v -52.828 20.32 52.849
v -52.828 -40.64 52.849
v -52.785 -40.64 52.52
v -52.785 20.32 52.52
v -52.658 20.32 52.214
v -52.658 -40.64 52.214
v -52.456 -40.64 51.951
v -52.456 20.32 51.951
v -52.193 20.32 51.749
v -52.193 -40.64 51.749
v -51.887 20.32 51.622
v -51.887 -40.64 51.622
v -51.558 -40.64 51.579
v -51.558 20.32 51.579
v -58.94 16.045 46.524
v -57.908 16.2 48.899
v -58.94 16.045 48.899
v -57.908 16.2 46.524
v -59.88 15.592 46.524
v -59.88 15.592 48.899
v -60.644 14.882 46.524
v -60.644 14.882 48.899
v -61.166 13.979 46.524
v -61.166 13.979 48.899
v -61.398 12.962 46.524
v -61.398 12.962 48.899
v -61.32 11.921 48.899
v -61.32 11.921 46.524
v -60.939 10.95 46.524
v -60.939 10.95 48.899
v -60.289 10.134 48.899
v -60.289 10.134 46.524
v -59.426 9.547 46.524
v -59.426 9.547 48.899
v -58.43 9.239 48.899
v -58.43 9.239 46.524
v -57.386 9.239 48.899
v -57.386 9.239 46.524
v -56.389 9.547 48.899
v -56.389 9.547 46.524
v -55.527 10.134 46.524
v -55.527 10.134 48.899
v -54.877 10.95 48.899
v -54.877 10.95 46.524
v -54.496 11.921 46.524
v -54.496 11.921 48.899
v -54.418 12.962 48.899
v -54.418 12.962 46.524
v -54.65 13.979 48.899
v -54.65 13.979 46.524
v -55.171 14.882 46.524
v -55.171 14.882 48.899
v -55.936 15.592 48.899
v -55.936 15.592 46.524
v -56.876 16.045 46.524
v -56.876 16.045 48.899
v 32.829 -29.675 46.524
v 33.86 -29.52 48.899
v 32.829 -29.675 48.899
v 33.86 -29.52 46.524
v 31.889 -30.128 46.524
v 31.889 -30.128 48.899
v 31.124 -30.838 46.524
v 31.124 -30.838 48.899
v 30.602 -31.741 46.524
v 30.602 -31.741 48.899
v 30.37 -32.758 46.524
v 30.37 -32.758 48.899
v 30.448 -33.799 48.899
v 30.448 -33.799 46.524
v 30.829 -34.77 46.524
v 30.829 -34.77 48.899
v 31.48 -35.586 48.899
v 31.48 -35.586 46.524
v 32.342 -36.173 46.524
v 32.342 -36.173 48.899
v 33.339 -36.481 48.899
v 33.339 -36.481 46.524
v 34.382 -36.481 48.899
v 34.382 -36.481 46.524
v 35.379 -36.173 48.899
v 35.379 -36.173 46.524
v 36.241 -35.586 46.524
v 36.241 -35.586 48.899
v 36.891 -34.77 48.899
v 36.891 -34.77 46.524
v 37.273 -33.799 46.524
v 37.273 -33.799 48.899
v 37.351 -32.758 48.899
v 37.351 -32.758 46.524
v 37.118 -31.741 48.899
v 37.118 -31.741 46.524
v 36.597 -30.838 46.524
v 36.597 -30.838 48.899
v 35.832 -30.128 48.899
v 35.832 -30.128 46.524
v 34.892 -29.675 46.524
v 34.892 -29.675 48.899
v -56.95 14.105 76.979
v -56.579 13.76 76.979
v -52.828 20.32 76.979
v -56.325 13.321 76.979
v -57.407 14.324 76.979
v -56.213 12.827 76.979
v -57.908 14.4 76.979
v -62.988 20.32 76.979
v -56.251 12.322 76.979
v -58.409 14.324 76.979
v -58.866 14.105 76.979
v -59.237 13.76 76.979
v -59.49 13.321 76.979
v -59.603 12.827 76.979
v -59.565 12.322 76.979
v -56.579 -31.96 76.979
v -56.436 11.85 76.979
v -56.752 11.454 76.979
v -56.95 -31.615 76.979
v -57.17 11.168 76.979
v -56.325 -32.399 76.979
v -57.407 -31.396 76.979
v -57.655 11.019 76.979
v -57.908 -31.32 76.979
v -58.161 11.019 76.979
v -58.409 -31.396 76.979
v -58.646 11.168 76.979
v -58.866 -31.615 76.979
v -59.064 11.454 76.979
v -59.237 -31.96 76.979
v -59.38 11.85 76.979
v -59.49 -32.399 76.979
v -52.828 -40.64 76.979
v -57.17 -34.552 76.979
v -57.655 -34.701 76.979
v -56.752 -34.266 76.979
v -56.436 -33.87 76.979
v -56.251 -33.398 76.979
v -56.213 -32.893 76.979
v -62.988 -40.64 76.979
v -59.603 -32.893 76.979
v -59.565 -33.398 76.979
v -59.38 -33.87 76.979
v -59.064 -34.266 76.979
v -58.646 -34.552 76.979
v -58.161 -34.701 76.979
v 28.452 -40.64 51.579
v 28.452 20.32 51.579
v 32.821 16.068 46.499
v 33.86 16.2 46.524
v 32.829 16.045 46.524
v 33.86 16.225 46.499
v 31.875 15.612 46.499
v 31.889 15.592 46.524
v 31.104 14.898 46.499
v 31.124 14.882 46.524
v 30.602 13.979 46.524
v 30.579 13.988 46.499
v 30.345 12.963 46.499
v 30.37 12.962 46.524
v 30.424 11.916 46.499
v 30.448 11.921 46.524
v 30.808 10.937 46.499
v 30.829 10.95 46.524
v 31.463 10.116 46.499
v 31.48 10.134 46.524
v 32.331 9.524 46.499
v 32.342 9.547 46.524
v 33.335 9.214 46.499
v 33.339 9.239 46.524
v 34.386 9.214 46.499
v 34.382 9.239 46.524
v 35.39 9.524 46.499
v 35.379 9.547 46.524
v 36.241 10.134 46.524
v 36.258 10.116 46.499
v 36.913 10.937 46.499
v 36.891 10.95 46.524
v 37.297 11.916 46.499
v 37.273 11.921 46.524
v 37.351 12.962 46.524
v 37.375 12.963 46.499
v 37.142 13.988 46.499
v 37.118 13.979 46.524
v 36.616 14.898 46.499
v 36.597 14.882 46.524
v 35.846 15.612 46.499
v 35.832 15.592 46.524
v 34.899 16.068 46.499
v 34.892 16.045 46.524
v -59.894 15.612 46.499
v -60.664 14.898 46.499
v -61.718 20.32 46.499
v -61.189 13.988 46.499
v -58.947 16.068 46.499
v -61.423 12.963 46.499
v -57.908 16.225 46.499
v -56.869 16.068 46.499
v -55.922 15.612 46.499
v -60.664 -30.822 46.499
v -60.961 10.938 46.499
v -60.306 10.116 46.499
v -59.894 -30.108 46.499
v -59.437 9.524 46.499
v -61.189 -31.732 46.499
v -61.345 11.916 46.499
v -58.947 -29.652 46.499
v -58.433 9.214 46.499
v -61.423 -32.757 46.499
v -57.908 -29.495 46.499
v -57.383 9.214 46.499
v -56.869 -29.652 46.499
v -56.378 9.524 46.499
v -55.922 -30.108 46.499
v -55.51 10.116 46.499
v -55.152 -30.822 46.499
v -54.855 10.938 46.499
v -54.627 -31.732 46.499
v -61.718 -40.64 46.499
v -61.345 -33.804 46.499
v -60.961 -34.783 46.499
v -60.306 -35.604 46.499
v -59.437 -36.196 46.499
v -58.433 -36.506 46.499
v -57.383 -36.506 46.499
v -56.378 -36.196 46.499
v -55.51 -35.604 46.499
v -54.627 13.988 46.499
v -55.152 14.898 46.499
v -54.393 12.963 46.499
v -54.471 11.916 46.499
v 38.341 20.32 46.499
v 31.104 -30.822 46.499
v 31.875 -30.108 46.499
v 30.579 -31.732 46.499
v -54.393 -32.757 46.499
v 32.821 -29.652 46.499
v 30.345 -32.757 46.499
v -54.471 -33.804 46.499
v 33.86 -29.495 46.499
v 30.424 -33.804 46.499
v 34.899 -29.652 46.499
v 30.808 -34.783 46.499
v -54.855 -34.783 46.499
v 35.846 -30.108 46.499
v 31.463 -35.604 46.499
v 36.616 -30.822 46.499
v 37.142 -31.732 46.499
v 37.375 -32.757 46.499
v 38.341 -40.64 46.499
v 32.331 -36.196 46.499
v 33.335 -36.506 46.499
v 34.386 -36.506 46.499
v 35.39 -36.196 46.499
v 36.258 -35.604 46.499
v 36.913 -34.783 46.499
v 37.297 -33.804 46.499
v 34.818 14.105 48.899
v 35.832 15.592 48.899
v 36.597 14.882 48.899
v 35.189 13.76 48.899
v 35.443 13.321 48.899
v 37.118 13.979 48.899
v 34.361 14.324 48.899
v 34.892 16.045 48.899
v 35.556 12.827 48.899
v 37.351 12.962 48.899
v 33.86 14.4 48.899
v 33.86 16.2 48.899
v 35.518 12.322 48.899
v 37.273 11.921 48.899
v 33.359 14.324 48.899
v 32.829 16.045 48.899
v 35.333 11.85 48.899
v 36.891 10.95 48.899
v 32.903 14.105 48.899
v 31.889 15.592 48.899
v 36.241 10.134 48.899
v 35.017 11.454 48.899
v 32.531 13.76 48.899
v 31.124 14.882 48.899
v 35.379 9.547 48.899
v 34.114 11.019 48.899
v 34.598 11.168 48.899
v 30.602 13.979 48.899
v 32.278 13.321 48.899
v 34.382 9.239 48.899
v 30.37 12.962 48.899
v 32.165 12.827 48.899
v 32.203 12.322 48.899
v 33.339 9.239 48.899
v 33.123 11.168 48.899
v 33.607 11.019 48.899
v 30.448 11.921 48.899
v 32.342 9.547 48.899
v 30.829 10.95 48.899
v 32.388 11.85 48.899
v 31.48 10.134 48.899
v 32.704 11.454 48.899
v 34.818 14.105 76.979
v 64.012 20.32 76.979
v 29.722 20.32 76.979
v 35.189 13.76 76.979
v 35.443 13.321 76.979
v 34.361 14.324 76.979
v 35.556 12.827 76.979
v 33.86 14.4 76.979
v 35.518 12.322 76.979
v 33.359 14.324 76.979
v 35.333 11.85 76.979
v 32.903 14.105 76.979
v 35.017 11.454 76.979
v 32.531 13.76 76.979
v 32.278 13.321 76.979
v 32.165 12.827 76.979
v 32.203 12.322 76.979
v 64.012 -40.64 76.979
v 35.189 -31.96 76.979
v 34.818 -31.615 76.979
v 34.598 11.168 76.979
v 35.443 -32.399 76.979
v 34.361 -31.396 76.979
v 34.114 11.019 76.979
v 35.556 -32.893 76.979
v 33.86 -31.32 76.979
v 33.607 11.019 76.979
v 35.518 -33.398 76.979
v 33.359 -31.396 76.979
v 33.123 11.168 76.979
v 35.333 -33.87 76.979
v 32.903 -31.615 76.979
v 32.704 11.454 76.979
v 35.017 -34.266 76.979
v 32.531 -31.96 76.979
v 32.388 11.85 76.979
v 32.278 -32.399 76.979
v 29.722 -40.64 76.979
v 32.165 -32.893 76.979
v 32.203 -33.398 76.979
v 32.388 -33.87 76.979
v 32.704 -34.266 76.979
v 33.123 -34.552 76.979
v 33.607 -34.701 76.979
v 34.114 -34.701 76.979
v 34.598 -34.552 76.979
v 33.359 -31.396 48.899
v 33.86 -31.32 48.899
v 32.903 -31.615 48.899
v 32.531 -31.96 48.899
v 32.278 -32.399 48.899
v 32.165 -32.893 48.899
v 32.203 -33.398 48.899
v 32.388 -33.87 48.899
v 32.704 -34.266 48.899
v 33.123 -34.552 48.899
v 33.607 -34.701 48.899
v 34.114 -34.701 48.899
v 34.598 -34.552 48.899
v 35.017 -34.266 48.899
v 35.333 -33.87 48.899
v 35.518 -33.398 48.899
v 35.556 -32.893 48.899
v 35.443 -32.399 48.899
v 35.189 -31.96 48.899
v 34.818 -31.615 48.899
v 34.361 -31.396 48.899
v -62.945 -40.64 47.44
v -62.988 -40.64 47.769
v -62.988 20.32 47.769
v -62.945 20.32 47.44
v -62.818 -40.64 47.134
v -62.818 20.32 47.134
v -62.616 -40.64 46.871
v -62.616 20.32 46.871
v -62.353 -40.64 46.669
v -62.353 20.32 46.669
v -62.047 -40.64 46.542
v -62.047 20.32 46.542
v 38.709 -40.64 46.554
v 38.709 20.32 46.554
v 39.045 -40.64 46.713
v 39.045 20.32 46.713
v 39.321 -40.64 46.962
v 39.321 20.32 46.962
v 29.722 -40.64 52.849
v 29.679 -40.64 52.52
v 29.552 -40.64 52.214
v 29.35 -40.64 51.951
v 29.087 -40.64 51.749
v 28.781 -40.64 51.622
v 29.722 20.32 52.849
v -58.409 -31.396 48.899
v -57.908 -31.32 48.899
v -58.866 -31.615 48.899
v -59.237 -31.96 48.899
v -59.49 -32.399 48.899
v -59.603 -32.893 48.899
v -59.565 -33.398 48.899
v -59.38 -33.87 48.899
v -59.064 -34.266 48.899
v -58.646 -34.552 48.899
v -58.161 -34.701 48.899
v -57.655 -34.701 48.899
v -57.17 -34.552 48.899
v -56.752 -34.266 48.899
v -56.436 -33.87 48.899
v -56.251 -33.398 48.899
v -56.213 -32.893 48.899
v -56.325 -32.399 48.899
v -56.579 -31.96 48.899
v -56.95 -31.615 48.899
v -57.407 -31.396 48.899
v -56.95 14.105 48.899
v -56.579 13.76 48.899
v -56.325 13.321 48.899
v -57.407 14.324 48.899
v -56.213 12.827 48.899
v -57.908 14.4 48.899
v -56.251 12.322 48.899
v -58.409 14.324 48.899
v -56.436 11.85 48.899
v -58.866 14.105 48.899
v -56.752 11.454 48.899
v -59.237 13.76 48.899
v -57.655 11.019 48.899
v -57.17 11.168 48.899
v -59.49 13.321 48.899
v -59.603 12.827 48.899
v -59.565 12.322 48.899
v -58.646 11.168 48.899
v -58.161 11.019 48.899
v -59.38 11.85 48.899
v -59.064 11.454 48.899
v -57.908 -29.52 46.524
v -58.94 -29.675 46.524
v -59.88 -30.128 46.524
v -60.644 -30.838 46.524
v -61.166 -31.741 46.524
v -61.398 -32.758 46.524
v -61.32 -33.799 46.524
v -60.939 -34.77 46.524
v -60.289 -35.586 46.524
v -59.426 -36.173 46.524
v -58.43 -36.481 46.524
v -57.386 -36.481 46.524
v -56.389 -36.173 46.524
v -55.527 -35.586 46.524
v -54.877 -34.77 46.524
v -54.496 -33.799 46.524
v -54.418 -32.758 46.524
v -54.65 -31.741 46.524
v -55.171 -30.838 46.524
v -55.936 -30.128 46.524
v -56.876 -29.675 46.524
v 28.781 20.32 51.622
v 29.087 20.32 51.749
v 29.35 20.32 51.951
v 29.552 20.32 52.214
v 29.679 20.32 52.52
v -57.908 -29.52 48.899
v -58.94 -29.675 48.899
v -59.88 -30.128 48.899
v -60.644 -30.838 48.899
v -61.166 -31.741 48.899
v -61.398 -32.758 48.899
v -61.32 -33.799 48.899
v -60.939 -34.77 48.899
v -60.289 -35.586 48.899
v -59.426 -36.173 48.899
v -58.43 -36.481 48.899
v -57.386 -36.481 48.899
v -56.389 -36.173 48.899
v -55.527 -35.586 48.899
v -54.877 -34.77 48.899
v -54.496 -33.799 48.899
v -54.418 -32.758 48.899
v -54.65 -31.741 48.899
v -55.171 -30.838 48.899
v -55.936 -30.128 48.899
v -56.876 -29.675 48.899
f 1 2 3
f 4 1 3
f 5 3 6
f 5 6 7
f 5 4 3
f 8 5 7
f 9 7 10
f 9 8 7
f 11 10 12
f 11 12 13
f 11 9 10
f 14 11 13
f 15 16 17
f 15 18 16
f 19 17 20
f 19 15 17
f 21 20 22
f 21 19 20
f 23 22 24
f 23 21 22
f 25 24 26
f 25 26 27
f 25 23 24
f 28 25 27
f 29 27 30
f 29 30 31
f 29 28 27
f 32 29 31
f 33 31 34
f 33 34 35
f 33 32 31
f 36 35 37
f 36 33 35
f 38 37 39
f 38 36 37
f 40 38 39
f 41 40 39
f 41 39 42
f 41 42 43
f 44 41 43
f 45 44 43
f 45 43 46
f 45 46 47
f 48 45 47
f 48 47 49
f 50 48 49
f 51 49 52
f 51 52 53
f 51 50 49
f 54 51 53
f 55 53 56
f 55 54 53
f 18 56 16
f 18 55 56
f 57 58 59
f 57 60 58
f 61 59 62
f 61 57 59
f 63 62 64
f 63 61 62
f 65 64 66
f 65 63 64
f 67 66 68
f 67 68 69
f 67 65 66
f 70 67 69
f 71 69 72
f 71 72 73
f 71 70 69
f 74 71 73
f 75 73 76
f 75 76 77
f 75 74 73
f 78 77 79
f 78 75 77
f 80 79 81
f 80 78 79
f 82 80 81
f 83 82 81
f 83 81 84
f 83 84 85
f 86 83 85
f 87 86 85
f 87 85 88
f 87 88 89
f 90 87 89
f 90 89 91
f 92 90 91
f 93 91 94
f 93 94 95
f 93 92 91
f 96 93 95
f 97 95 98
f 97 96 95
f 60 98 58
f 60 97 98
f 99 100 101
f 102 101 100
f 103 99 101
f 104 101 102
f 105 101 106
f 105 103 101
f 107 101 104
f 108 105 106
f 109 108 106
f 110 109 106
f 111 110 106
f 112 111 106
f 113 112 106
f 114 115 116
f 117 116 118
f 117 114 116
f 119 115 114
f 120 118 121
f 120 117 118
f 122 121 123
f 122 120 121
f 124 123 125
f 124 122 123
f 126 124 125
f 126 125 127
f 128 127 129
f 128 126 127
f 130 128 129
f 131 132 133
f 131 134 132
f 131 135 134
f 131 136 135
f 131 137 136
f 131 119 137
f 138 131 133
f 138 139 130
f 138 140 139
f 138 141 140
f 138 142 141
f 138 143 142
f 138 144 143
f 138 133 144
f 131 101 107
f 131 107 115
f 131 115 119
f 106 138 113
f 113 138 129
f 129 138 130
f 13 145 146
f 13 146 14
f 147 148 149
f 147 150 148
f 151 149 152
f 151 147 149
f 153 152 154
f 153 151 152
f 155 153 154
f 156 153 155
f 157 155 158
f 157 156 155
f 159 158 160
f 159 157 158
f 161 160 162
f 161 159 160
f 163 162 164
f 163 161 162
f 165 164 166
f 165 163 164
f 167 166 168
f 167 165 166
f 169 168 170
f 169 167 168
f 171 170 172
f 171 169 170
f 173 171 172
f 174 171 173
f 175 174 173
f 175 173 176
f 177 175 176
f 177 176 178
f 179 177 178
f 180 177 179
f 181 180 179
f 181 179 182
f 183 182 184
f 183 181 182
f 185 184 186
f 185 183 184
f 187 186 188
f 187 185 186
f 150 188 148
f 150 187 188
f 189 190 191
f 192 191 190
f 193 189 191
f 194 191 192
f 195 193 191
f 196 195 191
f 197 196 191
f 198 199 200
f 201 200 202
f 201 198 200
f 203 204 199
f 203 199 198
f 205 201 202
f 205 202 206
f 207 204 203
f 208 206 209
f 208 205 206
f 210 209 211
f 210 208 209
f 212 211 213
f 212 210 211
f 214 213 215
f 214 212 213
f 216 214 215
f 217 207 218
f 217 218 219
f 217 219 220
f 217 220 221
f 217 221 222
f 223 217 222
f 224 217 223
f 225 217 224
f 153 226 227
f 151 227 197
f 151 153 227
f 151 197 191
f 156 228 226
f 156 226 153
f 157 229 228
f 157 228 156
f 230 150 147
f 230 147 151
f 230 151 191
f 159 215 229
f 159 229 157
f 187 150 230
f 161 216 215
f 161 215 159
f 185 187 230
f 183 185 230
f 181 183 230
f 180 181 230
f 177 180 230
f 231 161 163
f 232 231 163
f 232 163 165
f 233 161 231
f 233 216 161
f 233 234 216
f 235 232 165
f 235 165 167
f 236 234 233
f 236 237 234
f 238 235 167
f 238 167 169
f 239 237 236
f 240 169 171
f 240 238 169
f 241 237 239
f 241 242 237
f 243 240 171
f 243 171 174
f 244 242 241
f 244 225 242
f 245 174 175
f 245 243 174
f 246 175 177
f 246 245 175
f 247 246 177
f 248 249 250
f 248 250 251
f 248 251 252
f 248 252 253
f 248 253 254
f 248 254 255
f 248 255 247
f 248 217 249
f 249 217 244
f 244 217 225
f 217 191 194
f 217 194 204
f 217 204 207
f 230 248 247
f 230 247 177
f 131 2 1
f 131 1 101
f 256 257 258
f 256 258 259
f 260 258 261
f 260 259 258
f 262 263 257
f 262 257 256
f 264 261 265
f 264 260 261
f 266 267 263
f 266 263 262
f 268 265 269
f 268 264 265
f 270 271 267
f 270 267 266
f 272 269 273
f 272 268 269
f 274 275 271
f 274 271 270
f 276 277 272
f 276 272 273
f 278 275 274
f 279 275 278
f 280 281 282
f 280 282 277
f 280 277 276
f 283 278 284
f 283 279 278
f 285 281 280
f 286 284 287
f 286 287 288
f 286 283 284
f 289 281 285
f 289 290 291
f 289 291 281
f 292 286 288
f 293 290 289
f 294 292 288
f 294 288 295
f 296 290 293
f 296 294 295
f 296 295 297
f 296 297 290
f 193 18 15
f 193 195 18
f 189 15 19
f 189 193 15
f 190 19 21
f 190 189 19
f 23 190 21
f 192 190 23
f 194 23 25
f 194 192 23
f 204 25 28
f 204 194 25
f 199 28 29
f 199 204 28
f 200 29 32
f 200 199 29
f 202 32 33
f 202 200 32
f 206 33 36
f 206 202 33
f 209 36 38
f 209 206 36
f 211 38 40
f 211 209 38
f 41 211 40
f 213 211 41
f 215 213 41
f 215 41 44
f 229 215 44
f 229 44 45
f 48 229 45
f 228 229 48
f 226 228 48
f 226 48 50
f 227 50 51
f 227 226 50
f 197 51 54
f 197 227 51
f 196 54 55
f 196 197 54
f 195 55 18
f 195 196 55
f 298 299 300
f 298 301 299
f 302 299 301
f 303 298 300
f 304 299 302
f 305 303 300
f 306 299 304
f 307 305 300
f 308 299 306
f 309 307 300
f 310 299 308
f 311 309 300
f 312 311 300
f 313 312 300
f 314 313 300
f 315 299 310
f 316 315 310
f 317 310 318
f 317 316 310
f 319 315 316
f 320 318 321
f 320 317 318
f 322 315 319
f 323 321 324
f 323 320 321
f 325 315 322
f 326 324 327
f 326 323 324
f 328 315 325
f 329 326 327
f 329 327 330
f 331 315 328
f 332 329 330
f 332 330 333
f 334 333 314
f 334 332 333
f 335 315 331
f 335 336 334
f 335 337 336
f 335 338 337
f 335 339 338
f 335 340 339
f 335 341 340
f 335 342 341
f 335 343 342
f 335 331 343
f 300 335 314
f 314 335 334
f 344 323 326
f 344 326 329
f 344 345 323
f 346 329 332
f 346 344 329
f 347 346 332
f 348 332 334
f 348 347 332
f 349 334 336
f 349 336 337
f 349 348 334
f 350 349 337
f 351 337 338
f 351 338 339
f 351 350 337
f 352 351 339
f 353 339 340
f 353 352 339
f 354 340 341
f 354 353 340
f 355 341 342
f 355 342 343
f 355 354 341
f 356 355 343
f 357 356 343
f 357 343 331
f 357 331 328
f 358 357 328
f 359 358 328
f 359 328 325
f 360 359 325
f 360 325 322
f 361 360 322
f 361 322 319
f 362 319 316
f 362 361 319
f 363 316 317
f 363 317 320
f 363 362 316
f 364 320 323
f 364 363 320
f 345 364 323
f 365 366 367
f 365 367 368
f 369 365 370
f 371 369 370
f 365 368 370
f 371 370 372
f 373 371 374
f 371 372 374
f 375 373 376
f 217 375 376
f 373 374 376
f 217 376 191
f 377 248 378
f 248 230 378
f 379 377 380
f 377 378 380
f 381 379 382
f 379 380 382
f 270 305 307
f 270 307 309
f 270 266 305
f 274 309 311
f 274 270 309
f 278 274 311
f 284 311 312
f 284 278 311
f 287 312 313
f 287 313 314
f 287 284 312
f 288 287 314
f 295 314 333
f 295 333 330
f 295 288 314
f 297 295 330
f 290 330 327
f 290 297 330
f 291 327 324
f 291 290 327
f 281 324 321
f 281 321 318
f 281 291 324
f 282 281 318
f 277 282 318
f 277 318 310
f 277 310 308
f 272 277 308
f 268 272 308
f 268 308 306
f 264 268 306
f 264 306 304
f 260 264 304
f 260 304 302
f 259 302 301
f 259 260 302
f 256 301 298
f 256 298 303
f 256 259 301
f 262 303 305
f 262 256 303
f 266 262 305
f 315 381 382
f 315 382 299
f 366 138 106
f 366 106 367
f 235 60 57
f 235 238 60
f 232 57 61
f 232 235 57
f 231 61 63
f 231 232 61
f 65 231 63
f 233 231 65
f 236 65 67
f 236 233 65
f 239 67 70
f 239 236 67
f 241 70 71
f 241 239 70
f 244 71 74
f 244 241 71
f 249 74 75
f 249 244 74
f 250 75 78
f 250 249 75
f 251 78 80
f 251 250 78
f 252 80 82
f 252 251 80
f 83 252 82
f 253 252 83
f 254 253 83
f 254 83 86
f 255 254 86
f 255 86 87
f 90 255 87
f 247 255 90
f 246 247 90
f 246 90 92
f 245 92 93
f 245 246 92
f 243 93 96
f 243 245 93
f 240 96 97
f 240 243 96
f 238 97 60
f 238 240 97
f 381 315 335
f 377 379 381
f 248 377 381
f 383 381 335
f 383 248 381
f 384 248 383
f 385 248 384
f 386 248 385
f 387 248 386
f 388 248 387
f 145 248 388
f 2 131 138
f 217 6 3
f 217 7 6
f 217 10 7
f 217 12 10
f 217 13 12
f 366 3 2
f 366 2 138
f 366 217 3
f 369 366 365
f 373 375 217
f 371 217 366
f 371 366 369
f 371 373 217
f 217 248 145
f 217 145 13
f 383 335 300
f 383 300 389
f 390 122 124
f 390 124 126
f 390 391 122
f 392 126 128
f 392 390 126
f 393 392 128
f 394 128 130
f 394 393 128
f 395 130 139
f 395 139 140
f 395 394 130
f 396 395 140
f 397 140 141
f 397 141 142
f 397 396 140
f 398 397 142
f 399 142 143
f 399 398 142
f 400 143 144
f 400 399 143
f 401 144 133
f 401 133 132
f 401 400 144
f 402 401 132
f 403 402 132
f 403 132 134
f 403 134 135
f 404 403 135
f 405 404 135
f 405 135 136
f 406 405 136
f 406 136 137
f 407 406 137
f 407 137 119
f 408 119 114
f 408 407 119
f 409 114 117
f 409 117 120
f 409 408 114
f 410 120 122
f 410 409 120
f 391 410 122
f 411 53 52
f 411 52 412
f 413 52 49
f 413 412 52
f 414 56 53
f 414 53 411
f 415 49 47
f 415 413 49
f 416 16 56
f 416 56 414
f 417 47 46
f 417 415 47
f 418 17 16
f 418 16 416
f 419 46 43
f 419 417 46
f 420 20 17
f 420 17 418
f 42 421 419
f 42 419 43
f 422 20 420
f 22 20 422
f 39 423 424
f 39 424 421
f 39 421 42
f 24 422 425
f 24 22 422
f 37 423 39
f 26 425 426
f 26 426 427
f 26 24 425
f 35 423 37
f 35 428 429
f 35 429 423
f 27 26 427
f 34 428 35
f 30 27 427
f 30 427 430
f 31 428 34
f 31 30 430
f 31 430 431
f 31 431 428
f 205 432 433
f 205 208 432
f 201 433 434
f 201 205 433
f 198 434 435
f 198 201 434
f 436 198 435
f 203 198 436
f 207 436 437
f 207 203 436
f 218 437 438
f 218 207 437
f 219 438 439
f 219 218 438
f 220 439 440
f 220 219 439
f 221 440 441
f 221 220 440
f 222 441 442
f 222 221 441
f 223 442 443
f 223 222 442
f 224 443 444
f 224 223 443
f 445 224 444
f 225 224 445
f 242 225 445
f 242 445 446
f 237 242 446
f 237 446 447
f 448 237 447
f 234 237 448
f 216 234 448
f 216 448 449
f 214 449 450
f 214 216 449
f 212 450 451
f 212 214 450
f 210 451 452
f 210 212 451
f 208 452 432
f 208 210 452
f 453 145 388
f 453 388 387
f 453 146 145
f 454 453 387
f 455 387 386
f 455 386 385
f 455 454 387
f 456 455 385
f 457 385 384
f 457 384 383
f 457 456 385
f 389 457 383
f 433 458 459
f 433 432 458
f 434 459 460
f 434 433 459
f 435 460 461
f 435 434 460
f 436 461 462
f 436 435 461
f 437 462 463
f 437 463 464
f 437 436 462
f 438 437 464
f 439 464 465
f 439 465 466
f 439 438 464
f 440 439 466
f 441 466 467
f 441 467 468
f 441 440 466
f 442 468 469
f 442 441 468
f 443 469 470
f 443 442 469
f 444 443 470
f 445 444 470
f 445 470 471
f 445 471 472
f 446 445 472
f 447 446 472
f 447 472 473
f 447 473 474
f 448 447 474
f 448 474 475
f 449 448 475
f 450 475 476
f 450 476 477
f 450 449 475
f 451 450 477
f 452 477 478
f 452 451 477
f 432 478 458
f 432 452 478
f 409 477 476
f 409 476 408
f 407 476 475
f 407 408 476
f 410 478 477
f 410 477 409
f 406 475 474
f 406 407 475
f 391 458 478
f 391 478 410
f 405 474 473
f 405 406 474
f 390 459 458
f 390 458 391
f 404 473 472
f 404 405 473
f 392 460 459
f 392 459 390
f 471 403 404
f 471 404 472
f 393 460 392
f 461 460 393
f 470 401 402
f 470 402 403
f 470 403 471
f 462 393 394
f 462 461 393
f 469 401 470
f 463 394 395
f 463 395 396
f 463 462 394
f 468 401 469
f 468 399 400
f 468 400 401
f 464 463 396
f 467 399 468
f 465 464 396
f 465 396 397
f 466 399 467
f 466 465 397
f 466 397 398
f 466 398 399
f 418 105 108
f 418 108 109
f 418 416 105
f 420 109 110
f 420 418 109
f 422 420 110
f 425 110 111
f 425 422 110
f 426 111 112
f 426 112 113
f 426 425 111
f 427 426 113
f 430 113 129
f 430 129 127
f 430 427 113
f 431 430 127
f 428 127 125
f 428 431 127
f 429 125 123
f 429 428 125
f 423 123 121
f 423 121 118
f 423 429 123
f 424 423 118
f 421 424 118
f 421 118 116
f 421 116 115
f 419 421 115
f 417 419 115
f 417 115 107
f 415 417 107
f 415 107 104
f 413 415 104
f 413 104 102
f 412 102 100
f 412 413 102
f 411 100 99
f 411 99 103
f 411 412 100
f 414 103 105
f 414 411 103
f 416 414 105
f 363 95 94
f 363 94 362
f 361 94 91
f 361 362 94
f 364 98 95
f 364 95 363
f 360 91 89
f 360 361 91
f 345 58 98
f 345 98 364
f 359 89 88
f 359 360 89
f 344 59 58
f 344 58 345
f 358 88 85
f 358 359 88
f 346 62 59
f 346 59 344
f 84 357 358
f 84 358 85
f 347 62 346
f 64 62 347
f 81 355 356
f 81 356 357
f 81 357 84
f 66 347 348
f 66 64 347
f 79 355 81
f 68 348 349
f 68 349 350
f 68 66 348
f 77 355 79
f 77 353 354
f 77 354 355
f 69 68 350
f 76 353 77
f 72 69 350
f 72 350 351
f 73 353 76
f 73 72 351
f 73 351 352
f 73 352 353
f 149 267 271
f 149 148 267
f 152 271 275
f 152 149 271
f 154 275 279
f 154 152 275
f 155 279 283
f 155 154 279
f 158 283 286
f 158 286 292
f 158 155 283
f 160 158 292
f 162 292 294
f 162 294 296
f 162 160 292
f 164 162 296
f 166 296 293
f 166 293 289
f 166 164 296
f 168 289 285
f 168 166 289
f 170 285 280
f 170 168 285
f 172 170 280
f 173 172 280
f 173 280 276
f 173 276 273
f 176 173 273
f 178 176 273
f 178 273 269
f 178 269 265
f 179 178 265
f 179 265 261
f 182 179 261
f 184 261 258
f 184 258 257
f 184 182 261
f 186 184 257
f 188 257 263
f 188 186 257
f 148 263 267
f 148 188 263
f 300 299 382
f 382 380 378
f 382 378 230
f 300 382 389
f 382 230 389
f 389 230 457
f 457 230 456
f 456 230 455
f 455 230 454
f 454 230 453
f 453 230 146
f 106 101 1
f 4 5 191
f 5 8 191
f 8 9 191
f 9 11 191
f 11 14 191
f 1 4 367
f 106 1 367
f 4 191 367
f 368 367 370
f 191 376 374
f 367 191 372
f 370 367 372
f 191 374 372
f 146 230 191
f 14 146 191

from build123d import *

# Parameters (mm, degrees)
BOSS_EXTRUDE1_DEPTH                           = 20.32
BOSS_EXTRUDE1_DEPTH_BACK                      = 40.64
CBORE_FOR_M3_PAN_HEAD_MACHINE_SCREW1_AT_COUNT = 2
CBORE_FOR_M3_PAN_HEAD_MACHINE_SCREW1_AT_PITCH = 91.768246806
CBORE_FOR_M3_PAN_HEAD_MACHINE_SCREW1_2_COUNT  = 2
CBORE_FOR_M3_PAN_HEAD_MACHINE_SCREW1_2_PITCH  = 102.526725891
CBORE_FOR_M3_PAN_HEAD_MACHINE_SCREW1_3_COUNT  = 2
CBORE_FOR_M3_PAN_HEAD_MACHINE_SCREW1_3_PITCH  = 45.72
FILLET1_R                                     = 1.27


with BuildPart() as part:
    # Sketch1 → Boss-Extrude1 (new, two sides: drawn at the far end of the back side and taken through both)
    with BuildSketch(Plane(origin=(0, 0, 0), x_dir=(1, 0, 0), z_dir=(0, 1, 0)).offset(-BOSS_EXTRUDE1_DEPTH_BACK)):
        Polygon((-52.827899024, -76.979185495), (-62.987899024, -76.979185495), (-62.987899024, -46.499185495), (38.940347782, -46.499185495), (64.012100976, -76.979185495), (29.722100976, -76.979185495), (29.722100976, -51.579185495), (-52.827899024, -51.579185495), align=None)
    extrude(amount=BOSS_EXTRUDE1_DEPTH + BOSS_EXTRUDE1_DEPTH_BACK)

    # Sketch4 → CBORE for M3 Pan Head Machine Screw1 (revolve, cut)
    with BuildSketch(Plane(origin=(33.860347782, -33.02, 46.499185495), x_dir=(0, 1, 0), z_dir=(1, 0, 0))):
        Polygon((0, 0), (0, 30.48), (1.7, 30.48), (1.7, 2.4), (3.5, 2.4), (3.5, 0.025), (3.525, 0), align=None)
    cbore_for_m3_pan_head_machine_screw1 = revolve(axis=Axis((33.860347782, -33.02, 40.149185495), (0, 0, 1)), mode=Mode.SUBTRACT)

    # CBORE for M3 Pan Head Machine Screw1 at: CBORE for M3 Pan Head Machine Screw1 ×2
    with Locations(*[(-i * CBORE_FOR_M3_PAN_HEAD_MACHINE_SCREW1_AT_PITCH, 0, 0) for i in range(1, CBORE_FOR_M3_PAN_HEAD_MACHINE_SCREW1_AT_COUNT)]):
        add(cbore_for_m3_pan_head_machine_screw1, mode=Mode.SUBTRACT)

    # CBORE for M3 Pan Head Machine Screw1 2: CBORE for M3 Pan Head Machine Screw1 ×2
    with Locations(*[Vector(-0.8950665888221234, 0.4459325078689913, 0) * (i * CBORE_FOR_M3_PAN_HEAD_MACHINE_SCREW1_2_PITCH) for i in range(1, CBORE_FOR_M3_PAN_HEAD_MACHINE_SCREW1_2_COUNT)]):
        add(cbore_for_m3_pan_head_machine_screw1, mode=Mode.SUBTRACT)

    # CBORE for M3 Pan Head Machine Screw1 3: CBORE for M3 Pan Head Machine Screw1 ×2
    with Locations(*[(0, i * CBORE_FOR_M3_PAN_HEAD_MACHINE_SCREW1_3_PITCH, 0) for i in range(1, CBORE_FOR_M3_PAN_HEAD_MACHINE_SCREW1_3_COUNT)]):
        add(cbore_for_m3_pan_head_machine_screw1, mode=Mode.SUBTRACT)

    # Fillet1
    fillet1_edges = [part.edges().sort_by_distance(p)[0] for p in [
        (-62.987899024, -10.16, 46.499185495),
        (38.940347782, -10.16, 46.499185495),
        (29.722100976, -10.16, 51.579185495),
        (-52.827899024, -10.16, 51.579185495),
    ]]
    fillet(fillet1_edges, radius=FILLET1_R)


solid = part.part
